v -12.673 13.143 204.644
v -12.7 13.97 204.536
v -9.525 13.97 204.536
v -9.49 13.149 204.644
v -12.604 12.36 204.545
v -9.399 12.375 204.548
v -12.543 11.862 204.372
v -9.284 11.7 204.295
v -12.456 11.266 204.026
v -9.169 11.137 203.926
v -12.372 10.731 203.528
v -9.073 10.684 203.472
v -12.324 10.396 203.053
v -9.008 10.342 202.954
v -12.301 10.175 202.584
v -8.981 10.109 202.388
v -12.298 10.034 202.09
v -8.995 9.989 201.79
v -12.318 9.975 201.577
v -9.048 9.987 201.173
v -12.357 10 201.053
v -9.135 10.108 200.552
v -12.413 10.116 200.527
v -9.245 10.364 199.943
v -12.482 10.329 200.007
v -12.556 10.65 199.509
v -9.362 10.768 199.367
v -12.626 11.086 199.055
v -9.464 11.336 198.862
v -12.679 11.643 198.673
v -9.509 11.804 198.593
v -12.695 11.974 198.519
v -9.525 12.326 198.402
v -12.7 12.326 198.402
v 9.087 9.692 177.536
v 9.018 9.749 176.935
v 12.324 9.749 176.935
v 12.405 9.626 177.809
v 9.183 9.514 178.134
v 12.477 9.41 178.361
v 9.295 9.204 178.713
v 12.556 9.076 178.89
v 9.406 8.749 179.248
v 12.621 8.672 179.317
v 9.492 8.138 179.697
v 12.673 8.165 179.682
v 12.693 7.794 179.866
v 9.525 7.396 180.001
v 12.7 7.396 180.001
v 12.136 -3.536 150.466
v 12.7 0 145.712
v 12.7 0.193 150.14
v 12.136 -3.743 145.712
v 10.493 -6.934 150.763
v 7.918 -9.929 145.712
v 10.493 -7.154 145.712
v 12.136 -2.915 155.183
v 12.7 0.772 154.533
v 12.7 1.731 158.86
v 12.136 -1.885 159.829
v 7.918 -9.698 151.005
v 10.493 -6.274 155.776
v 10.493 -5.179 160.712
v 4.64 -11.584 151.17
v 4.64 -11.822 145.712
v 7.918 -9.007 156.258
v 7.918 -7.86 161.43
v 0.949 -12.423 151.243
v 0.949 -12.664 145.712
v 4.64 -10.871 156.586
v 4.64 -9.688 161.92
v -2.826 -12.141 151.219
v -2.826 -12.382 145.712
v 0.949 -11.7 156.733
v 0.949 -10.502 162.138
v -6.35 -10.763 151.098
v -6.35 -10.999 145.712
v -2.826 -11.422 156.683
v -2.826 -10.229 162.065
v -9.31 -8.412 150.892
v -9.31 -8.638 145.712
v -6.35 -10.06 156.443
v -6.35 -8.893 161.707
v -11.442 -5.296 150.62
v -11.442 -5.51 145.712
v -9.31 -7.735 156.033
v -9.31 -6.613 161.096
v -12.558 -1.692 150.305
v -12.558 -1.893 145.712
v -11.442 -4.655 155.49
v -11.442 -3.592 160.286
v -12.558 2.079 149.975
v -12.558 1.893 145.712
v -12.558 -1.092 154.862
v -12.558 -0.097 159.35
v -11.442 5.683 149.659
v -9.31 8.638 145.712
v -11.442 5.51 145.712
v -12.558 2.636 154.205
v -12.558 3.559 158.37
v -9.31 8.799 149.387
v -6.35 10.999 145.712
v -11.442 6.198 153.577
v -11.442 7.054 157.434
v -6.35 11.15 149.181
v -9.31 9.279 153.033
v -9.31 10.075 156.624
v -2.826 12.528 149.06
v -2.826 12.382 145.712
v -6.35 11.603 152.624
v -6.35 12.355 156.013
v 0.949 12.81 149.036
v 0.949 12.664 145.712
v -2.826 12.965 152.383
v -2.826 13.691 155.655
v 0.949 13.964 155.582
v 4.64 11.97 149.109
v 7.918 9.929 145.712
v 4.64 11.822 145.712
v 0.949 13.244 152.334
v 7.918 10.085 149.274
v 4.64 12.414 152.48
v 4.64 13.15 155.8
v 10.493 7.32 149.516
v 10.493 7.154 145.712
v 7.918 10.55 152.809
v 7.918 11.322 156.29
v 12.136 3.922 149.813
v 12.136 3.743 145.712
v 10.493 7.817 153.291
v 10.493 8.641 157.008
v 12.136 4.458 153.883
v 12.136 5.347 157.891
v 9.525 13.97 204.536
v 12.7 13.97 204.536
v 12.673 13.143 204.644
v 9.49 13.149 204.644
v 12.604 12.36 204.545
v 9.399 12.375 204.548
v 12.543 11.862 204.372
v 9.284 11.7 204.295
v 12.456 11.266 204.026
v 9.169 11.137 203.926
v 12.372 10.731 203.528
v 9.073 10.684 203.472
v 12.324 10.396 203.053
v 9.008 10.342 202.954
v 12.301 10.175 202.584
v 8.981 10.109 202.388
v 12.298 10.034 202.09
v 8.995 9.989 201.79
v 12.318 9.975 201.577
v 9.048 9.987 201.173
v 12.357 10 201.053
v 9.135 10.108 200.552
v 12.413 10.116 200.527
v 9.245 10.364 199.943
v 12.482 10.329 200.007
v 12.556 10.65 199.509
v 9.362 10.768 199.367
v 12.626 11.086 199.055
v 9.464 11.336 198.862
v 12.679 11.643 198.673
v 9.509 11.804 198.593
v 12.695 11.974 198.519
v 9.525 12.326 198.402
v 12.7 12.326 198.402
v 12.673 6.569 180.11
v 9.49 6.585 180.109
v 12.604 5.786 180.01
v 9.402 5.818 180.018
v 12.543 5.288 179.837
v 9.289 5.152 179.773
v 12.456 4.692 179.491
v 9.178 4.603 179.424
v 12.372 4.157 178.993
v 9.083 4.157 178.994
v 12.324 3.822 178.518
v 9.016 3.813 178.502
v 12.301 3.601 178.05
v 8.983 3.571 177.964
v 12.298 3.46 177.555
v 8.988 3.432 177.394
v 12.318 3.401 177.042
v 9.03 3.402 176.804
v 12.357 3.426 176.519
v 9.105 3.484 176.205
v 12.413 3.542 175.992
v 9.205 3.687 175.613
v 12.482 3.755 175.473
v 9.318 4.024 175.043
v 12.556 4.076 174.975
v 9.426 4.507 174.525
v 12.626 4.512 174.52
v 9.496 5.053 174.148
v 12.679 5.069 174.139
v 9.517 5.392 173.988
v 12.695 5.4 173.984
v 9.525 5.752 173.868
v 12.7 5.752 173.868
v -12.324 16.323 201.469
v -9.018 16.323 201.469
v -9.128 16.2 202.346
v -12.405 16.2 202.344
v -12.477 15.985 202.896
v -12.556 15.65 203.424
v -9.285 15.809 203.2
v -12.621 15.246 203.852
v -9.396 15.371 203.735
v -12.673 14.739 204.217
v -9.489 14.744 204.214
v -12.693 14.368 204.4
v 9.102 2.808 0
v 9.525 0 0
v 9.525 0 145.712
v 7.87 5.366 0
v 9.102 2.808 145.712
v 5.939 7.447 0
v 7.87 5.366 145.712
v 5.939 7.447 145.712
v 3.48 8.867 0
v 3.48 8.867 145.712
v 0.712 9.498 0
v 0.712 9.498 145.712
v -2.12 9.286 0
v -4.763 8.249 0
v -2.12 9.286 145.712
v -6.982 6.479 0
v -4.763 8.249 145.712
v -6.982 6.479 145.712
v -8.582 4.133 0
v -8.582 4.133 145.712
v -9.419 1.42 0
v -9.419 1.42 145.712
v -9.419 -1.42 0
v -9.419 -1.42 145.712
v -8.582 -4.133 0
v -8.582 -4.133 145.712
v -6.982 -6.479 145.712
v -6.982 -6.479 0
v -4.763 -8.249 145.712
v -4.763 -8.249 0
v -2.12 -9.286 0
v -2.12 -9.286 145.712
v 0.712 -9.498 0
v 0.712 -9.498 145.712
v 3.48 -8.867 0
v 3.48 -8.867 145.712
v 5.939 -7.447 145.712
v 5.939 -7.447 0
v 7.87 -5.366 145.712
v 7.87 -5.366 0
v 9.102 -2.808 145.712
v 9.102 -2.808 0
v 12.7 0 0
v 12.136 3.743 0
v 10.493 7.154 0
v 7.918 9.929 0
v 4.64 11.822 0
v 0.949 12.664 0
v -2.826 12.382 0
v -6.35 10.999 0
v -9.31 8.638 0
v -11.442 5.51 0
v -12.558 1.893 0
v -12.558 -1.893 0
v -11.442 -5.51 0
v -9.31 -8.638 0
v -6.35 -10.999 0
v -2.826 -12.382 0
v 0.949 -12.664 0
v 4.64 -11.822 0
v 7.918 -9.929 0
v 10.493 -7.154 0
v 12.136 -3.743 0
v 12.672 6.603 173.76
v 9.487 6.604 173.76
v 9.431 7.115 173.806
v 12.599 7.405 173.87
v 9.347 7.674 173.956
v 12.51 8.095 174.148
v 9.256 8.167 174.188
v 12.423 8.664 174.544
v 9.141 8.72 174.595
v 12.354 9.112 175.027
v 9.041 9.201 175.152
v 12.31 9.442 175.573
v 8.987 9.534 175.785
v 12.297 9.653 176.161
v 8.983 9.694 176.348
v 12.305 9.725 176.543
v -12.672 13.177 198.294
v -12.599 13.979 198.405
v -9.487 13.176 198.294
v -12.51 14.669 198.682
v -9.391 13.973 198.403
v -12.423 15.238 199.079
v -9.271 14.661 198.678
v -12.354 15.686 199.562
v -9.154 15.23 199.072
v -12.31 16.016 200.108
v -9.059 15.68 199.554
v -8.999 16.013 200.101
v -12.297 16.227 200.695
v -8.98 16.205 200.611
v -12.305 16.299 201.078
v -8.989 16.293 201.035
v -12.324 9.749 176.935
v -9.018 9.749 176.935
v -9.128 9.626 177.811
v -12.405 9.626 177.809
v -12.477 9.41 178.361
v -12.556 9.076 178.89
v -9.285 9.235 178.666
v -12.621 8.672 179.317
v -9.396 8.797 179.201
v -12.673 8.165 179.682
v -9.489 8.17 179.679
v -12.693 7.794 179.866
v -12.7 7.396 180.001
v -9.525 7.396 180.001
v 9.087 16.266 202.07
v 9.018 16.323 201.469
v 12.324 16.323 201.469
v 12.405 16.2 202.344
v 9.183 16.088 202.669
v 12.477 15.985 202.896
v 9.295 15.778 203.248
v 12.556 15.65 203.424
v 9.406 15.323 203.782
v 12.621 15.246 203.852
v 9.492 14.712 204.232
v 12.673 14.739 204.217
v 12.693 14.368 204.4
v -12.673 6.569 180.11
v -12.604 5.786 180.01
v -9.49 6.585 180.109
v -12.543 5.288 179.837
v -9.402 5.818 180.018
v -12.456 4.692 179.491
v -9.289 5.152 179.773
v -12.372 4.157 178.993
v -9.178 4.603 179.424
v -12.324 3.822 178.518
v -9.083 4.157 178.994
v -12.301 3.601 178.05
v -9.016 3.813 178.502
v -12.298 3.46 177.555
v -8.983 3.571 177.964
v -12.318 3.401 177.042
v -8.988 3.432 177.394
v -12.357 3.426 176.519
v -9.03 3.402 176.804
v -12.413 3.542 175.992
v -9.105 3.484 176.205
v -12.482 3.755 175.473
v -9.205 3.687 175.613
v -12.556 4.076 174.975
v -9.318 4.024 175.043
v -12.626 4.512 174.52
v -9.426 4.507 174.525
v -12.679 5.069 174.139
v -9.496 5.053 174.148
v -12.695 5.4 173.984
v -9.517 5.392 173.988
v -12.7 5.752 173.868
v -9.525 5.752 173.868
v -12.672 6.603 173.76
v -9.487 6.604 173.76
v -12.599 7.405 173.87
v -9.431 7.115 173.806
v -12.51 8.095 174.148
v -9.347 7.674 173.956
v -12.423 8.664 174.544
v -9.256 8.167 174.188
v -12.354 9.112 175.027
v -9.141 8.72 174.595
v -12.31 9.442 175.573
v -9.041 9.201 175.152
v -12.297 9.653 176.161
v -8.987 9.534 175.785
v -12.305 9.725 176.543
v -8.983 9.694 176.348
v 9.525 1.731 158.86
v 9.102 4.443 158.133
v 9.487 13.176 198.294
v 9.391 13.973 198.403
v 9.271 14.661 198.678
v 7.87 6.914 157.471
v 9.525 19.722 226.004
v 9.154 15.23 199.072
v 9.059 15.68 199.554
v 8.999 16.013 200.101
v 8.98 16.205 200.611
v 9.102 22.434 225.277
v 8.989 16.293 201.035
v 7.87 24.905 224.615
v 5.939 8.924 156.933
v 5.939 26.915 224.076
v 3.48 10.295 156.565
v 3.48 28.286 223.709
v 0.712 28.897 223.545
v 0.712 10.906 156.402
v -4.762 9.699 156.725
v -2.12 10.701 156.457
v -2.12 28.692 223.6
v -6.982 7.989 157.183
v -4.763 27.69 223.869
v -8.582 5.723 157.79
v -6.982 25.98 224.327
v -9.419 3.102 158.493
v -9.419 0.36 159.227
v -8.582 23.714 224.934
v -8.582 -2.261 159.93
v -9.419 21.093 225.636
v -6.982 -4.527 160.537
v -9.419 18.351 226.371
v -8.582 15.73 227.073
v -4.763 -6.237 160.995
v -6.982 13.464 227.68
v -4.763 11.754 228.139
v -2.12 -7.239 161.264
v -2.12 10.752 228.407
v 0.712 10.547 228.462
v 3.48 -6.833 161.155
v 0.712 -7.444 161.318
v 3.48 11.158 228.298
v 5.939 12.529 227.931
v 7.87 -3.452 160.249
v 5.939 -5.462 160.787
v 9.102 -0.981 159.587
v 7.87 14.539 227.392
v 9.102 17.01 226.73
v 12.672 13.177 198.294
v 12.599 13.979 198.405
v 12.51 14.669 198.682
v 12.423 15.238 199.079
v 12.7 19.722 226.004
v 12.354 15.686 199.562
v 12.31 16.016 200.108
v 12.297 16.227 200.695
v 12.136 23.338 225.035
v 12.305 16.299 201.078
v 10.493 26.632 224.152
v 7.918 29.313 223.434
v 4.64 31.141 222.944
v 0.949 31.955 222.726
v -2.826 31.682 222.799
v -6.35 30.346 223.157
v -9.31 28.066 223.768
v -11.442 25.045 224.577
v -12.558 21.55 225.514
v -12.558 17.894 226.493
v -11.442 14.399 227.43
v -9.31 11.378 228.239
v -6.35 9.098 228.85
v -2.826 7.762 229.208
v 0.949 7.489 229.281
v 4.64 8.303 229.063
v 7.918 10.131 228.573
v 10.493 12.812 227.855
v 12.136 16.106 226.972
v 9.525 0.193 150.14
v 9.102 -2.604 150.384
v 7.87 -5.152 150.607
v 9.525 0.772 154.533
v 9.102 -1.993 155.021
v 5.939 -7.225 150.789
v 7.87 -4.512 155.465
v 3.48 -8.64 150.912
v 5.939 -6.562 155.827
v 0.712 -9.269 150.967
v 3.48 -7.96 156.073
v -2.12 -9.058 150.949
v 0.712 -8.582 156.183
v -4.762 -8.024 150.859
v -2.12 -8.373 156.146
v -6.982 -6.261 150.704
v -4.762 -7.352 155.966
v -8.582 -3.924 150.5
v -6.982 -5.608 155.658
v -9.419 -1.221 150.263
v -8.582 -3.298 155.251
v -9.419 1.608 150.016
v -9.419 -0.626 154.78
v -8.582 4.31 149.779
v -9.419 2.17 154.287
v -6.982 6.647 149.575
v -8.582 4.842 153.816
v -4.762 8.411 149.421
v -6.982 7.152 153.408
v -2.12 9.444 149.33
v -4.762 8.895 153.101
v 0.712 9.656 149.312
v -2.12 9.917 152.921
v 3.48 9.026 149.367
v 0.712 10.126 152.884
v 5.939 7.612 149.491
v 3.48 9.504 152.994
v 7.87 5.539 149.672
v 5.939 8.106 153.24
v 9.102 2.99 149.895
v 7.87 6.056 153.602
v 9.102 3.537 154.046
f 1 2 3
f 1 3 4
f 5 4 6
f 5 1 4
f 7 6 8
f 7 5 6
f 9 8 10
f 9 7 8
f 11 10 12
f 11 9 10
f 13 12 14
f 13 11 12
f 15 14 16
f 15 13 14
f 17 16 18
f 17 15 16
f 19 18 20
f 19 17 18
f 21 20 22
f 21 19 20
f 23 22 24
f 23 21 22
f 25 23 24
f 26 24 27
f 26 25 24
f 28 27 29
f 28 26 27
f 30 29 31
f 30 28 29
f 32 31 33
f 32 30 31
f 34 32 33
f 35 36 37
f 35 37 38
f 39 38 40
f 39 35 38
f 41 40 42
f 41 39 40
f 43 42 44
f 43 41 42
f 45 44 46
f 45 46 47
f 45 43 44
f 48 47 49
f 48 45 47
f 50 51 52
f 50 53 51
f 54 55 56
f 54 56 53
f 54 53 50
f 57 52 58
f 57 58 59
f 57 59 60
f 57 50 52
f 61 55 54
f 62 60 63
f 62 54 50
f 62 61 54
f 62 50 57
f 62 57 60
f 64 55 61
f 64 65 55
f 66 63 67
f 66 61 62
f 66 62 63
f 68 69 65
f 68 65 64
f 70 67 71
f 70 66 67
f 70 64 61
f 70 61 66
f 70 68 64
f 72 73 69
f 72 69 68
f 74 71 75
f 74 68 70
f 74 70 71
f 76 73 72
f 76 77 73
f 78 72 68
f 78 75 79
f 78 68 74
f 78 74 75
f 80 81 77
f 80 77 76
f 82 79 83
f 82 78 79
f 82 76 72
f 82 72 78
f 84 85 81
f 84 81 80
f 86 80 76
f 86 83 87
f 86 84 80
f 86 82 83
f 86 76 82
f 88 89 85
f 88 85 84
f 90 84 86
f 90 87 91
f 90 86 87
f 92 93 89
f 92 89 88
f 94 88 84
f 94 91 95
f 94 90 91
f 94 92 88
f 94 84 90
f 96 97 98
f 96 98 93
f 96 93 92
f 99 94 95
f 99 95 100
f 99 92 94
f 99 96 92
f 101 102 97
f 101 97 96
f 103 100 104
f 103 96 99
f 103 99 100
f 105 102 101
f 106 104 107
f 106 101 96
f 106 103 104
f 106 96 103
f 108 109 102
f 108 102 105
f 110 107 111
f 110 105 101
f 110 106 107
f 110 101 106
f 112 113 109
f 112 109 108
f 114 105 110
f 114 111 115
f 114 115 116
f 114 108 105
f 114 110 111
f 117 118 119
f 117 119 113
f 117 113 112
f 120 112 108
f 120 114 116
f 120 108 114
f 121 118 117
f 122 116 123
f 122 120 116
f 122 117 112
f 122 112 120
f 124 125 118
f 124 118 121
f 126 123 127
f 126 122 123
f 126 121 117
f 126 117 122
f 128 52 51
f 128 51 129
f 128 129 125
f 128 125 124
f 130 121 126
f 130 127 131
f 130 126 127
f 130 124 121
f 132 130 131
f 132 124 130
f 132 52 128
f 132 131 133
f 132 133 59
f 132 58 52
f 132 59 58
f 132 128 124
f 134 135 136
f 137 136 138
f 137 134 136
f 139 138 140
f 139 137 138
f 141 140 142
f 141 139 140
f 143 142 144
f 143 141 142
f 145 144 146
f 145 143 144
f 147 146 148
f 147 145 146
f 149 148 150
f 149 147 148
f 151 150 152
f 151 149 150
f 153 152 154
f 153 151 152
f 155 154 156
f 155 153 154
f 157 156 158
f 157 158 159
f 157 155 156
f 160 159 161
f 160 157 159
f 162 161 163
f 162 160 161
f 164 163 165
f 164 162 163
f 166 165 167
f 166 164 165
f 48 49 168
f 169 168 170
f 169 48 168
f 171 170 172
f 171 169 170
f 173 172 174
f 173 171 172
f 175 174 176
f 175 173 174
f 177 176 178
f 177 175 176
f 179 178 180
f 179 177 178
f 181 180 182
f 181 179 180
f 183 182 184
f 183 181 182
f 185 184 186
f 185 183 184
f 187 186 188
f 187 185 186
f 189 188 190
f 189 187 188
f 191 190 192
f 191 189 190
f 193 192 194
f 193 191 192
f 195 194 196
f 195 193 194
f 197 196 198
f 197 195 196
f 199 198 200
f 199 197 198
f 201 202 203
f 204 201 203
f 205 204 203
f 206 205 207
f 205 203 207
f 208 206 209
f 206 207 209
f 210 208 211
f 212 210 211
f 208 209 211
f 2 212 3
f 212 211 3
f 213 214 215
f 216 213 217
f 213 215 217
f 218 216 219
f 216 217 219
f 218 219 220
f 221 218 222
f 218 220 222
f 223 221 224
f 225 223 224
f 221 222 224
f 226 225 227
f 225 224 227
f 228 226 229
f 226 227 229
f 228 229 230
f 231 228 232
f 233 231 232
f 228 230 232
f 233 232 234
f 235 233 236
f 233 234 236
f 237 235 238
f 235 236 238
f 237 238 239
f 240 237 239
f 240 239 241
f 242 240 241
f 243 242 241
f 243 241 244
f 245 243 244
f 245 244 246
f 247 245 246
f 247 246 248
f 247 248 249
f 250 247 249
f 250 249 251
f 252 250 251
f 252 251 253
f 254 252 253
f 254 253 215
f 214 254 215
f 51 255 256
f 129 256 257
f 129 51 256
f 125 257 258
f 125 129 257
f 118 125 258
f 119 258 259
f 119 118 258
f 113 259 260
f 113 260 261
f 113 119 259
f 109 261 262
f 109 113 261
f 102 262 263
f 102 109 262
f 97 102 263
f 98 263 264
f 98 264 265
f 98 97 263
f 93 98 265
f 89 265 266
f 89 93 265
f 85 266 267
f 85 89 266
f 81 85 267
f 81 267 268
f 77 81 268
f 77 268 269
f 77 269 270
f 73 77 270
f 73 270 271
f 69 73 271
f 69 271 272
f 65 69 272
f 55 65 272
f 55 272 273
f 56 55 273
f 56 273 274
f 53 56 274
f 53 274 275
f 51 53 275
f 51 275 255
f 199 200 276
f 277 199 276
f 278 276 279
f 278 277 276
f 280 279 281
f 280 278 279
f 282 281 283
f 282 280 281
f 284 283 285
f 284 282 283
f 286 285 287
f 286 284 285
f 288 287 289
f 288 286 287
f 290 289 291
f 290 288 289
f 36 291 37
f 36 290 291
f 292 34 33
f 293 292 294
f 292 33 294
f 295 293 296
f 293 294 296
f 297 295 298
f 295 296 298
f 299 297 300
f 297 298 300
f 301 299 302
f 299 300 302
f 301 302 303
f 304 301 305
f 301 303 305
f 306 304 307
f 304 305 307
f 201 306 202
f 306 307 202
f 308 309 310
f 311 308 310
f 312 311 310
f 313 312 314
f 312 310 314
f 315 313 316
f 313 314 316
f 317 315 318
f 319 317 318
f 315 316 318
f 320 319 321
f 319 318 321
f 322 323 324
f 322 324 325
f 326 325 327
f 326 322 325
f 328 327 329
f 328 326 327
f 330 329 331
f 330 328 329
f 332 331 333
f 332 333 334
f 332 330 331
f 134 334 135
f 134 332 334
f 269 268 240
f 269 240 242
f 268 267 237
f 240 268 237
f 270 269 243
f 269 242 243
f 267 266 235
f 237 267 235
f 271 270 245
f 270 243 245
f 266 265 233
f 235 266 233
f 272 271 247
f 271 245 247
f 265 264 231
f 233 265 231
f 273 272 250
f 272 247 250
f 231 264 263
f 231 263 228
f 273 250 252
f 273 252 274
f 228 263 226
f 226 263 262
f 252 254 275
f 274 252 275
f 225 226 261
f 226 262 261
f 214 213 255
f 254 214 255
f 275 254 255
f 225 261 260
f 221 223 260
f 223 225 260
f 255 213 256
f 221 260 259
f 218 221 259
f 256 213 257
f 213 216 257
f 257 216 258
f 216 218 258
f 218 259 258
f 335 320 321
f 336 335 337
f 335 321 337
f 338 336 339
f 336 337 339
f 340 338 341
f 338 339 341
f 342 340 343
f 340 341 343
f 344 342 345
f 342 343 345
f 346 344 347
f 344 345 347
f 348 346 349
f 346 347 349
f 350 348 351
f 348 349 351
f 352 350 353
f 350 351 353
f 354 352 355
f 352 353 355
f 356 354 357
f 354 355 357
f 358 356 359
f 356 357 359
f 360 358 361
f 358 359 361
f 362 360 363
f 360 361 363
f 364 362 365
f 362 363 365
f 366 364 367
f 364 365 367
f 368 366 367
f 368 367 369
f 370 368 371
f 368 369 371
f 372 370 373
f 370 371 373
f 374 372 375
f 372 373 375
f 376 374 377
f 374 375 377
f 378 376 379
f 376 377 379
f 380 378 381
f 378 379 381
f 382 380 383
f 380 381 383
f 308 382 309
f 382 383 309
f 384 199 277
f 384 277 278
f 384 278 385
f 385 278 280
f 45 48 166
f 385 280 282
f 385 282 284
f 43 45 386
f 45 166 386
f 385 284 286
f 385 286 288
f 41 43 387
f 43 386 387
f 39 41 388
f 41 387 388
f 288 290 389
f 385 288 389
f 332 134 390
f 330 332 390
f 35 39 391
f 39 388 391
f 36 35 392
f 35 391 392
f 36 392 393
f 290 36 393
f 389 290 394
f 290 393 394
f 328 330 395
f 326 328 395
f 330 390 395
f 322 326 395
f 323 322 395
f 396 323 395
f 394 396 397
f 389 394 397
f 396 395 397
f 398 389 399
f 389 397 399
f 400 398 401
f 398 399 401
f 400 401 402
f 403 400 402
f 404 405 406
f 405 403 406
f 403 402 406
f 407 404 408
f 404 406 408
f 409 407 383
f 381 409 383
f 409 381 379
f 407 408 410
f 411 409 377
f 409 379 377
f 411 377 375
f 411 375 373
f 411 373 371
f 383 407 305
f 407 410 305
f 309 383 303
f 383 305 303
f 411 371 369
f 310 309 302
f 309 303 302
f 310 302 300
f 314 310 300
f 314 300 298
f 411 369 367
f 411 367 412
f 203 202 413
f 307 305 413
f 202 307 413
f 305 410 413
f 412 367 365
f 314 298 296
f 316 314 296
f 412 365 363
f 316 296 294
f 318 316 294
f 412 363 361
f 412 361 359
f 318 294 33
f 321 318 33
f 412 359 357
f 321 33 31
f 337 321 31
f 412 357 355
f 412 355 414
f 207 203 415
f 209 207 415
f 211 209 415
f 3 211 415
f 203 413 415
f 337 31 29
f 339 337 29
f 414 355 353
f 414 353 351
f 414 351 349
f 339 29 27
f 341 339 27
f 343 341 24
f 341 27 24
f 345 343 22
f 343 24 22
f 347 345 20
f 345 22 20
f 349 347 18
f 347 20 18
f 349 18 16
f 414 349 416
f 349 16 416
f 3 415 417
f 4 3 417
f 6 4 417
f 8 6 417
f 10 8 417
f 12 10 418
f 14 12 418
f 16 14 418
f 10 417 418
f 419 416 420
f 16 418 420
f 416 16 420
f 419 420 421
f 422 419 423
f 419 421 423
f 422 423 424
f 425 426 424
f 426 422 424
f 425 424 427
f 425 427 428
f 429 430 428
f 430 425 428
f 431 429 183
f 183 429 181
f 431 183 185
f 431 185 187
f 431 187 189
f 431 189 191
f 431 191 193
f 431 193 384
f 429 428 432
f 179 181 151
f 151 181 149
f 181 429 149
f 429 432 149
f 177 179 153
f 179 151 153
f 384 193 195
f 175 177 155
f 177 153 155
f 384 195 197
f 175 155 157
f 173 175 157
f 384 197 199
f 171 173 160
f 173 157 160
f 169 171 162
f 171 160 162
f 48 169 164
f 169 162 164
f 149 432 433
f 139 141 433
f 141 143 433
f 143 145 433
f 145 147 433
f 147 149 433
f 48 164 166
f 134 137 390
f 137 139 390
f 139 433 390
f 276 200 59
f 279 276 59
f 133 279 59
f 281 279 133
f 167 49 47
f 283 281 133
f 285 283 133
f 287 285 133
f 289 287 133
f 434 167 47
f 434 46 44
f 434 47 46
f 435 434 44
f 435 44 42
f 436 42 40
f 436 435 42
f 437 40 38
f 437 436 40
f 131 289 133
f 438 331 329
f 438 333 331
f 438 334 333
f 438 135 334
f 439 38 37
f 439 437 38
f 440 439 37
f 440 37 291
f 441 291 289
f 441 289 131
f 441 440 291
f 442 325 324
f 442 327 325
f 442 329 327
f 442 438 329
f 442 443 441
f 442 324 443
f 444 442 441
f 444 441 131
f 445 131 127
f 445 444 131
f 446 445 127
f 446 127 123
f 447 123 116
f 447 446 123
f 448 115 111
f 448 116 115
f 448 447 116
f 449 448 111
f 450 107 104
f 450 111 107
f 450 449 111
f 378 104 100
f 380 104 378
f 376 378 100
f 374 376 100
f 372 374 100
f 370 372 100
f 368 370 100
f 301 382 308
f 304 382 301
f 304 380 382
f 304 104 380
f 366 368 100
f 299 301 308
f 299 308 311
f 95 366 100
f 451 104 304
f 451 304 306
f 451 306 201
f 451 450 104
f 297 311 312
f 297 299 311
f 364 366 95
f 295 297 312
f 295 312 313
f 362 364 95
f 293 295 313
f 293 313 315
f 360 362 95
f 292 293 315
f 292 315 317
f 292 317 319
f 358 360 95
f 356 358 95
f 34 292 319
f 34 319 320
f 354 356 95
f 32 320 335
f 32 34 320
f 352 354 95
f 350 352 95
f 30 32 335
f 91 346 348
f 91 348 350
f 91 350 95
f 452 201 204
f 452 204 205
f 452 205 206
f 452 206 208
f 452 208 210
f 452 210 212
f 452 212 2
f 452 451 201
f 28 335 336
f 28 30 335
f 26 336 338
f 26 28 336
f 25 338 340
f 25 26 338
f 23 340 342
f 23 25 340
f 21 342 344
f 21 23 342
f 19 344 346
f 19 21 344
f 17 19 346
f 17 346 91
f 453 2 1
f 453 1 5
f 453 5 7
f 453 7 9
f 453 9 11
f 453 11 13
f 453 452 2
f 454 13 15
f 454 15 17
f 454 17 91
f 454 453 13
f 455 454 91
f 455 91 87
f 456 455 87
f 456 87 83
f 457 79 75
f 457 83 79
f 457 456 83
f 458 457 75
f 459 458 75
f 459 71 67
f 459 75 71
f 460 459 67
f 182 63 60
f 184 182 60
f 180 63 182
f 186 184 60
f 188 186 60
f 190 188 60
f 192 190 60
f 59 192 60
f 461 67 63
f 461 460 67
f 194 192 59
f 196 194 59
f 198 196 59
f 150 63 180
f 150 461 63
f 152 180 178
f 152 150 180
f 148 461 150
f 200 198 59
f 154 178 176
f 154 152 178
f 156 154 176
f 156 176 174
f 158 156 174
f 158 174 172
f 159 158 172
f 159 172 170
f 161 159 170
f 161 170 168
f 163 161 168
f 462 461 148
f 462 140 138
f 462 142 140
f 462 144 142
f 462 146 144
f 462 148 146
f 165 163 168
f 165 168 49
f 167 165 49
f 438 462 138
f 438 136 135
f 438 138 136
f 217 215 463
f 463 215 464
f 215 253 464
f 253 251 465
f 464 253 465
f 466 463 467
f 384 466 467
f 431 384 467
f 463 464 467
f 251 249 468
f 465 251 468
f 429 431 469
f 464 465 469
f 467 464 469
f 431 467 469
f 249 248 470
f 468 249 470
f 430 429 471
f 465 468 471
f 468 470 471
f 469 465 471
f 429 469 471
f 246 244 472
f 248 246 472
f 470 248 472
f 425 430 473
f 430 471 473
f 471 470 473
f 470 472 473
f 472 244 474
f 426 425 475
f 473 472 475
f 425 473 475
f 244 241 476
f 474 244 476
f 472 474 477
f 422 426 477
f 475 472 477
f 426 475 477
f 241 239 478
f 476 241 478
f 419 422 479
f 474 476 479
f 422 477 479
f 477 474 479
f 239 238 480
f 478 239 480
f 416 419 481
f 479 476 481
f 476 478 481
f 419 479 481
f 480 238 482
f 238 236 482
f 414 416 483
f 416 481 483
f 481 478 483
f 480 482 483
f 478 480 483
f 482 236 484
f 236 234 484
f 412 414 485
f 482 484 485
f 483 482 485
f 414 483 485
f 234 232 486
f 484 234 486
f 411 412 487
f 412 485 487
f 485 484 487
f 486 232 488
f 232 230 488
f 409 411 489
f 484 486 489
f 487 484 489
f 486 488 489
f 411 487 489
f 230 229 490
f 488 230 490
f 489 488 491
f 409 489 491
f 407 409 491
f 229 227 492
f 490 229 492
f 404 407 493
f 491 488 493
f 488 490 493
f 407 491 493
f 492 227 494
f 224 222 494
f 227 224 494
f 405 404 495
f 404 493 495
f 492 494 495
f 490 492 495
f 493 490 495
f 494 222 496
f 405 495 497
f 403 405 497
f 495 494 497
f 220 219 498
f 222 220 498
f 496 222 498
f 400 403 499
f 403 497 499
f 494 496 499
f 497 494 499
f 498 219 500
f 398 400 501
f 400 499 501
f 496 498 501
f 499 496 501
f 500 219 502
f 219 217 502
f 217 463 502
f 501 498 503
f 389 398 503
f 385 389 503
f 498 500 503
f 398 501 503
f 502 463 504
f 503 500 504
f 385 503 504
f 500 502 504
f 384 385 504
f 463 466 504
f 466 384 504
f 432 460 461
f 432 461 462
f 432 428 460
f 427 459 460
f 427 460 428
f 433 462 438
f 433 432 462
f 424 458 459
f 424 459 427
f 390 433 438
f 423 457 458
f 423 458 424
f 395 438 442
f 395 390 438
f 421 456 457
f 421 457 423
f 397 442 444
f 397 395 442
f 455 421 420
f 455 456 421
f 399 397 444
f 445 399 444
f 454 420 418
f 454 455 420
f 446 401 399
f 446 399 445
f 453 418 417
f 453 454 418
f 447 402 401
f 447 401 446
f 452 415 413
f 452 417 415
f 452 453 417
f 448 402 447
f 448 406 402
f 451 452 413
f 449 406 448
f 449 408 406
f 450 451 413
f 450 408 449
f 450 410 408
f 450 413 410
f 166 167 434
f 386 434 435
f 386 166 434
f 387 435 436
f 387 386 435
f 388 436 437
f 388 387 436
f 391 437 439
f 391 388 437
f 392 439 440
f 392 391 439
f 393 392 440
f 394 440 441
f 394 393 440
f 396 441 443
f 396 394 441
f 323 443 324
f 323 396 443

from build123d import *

# Parameters (mm, degrees)
F0_R     = 12.7
F0_R_2   = 9.525
F3_DEPTH = 25.4


with BuildPart() as f2:
    # F2: sweep along a path in F1
    with BuildLine(Plane.YZ) as f2_path:
        Line((0, 0), (0, 145.7120531226))
        ThreePointArc((0, 145.7120531226), (0.4346010422, 152.3427836873), (1.7309680245, 158.8600606138))
        Line((1.7309680245, 158.8600606138), (19.7220112368, 226.0035479632))
    # F0 (on Top) → F2 (sweep)
    with BuildSketch(Plane.XY):
        Circle(F0_R)
        Circle(F0_R_2, mode=Mode.SUBTRACT)
    sweep(path=f2_path.line)

    # F1 (on Right) → F3 (cut, symmetric)
    with BuildSketch(Plane.YZ):
        with BuildLine():
            ThreePointArc((13.9697579594, 204.535846474), (10.0811929927, 202.2907824437), (12.326257023, 198.402217477))
            Line((12.326257023, 198.402217477), (13.9697579594, 204.535846474))
        make_face()
        with BuildLine():
            Line((13.9697579594, 204.535846474), (12.326257023, 198.402217477))
            ThreePointArc((12.326257023, 198.402217477), (15.0808250283, 198.9501351201), (16.3230074912, 201.4690319755))
            ThreePointArc((16.3230074912, 201.4690319755), (15.6669043466, 203.4018495126), (13.9697579594, 204.535846474))
        make_face()
        with BuildLine():
            Line((7.3957542138, 180.0013304862), (5.7522532774, 173.8677014893))
            ThreePointArc((5.7522532774, 173.8677014893), (8.5068212827, 174.4156191323), (9.7490037456, 176.9345159877))
            ThreePointArc((9.7490037456, 176.9345159877), (9.092900601, 178.8673335248), (7.3957542138, 180.0013304862))
        make_face()
        with BuildLine():
            ThreePointArc((7.3957542138, 180.0013304862), (3.5071892471, 177.7562664559), (5.7522532774, 173.8677014893))
            Line((5.7522532774, 173.8677014893), (7.3957542138, 180.0013304862))
        make_face()
    extrude(amount=F3_DEPTH, both=True, mode=Mode.SUBTRACT)


solid = f2.part
